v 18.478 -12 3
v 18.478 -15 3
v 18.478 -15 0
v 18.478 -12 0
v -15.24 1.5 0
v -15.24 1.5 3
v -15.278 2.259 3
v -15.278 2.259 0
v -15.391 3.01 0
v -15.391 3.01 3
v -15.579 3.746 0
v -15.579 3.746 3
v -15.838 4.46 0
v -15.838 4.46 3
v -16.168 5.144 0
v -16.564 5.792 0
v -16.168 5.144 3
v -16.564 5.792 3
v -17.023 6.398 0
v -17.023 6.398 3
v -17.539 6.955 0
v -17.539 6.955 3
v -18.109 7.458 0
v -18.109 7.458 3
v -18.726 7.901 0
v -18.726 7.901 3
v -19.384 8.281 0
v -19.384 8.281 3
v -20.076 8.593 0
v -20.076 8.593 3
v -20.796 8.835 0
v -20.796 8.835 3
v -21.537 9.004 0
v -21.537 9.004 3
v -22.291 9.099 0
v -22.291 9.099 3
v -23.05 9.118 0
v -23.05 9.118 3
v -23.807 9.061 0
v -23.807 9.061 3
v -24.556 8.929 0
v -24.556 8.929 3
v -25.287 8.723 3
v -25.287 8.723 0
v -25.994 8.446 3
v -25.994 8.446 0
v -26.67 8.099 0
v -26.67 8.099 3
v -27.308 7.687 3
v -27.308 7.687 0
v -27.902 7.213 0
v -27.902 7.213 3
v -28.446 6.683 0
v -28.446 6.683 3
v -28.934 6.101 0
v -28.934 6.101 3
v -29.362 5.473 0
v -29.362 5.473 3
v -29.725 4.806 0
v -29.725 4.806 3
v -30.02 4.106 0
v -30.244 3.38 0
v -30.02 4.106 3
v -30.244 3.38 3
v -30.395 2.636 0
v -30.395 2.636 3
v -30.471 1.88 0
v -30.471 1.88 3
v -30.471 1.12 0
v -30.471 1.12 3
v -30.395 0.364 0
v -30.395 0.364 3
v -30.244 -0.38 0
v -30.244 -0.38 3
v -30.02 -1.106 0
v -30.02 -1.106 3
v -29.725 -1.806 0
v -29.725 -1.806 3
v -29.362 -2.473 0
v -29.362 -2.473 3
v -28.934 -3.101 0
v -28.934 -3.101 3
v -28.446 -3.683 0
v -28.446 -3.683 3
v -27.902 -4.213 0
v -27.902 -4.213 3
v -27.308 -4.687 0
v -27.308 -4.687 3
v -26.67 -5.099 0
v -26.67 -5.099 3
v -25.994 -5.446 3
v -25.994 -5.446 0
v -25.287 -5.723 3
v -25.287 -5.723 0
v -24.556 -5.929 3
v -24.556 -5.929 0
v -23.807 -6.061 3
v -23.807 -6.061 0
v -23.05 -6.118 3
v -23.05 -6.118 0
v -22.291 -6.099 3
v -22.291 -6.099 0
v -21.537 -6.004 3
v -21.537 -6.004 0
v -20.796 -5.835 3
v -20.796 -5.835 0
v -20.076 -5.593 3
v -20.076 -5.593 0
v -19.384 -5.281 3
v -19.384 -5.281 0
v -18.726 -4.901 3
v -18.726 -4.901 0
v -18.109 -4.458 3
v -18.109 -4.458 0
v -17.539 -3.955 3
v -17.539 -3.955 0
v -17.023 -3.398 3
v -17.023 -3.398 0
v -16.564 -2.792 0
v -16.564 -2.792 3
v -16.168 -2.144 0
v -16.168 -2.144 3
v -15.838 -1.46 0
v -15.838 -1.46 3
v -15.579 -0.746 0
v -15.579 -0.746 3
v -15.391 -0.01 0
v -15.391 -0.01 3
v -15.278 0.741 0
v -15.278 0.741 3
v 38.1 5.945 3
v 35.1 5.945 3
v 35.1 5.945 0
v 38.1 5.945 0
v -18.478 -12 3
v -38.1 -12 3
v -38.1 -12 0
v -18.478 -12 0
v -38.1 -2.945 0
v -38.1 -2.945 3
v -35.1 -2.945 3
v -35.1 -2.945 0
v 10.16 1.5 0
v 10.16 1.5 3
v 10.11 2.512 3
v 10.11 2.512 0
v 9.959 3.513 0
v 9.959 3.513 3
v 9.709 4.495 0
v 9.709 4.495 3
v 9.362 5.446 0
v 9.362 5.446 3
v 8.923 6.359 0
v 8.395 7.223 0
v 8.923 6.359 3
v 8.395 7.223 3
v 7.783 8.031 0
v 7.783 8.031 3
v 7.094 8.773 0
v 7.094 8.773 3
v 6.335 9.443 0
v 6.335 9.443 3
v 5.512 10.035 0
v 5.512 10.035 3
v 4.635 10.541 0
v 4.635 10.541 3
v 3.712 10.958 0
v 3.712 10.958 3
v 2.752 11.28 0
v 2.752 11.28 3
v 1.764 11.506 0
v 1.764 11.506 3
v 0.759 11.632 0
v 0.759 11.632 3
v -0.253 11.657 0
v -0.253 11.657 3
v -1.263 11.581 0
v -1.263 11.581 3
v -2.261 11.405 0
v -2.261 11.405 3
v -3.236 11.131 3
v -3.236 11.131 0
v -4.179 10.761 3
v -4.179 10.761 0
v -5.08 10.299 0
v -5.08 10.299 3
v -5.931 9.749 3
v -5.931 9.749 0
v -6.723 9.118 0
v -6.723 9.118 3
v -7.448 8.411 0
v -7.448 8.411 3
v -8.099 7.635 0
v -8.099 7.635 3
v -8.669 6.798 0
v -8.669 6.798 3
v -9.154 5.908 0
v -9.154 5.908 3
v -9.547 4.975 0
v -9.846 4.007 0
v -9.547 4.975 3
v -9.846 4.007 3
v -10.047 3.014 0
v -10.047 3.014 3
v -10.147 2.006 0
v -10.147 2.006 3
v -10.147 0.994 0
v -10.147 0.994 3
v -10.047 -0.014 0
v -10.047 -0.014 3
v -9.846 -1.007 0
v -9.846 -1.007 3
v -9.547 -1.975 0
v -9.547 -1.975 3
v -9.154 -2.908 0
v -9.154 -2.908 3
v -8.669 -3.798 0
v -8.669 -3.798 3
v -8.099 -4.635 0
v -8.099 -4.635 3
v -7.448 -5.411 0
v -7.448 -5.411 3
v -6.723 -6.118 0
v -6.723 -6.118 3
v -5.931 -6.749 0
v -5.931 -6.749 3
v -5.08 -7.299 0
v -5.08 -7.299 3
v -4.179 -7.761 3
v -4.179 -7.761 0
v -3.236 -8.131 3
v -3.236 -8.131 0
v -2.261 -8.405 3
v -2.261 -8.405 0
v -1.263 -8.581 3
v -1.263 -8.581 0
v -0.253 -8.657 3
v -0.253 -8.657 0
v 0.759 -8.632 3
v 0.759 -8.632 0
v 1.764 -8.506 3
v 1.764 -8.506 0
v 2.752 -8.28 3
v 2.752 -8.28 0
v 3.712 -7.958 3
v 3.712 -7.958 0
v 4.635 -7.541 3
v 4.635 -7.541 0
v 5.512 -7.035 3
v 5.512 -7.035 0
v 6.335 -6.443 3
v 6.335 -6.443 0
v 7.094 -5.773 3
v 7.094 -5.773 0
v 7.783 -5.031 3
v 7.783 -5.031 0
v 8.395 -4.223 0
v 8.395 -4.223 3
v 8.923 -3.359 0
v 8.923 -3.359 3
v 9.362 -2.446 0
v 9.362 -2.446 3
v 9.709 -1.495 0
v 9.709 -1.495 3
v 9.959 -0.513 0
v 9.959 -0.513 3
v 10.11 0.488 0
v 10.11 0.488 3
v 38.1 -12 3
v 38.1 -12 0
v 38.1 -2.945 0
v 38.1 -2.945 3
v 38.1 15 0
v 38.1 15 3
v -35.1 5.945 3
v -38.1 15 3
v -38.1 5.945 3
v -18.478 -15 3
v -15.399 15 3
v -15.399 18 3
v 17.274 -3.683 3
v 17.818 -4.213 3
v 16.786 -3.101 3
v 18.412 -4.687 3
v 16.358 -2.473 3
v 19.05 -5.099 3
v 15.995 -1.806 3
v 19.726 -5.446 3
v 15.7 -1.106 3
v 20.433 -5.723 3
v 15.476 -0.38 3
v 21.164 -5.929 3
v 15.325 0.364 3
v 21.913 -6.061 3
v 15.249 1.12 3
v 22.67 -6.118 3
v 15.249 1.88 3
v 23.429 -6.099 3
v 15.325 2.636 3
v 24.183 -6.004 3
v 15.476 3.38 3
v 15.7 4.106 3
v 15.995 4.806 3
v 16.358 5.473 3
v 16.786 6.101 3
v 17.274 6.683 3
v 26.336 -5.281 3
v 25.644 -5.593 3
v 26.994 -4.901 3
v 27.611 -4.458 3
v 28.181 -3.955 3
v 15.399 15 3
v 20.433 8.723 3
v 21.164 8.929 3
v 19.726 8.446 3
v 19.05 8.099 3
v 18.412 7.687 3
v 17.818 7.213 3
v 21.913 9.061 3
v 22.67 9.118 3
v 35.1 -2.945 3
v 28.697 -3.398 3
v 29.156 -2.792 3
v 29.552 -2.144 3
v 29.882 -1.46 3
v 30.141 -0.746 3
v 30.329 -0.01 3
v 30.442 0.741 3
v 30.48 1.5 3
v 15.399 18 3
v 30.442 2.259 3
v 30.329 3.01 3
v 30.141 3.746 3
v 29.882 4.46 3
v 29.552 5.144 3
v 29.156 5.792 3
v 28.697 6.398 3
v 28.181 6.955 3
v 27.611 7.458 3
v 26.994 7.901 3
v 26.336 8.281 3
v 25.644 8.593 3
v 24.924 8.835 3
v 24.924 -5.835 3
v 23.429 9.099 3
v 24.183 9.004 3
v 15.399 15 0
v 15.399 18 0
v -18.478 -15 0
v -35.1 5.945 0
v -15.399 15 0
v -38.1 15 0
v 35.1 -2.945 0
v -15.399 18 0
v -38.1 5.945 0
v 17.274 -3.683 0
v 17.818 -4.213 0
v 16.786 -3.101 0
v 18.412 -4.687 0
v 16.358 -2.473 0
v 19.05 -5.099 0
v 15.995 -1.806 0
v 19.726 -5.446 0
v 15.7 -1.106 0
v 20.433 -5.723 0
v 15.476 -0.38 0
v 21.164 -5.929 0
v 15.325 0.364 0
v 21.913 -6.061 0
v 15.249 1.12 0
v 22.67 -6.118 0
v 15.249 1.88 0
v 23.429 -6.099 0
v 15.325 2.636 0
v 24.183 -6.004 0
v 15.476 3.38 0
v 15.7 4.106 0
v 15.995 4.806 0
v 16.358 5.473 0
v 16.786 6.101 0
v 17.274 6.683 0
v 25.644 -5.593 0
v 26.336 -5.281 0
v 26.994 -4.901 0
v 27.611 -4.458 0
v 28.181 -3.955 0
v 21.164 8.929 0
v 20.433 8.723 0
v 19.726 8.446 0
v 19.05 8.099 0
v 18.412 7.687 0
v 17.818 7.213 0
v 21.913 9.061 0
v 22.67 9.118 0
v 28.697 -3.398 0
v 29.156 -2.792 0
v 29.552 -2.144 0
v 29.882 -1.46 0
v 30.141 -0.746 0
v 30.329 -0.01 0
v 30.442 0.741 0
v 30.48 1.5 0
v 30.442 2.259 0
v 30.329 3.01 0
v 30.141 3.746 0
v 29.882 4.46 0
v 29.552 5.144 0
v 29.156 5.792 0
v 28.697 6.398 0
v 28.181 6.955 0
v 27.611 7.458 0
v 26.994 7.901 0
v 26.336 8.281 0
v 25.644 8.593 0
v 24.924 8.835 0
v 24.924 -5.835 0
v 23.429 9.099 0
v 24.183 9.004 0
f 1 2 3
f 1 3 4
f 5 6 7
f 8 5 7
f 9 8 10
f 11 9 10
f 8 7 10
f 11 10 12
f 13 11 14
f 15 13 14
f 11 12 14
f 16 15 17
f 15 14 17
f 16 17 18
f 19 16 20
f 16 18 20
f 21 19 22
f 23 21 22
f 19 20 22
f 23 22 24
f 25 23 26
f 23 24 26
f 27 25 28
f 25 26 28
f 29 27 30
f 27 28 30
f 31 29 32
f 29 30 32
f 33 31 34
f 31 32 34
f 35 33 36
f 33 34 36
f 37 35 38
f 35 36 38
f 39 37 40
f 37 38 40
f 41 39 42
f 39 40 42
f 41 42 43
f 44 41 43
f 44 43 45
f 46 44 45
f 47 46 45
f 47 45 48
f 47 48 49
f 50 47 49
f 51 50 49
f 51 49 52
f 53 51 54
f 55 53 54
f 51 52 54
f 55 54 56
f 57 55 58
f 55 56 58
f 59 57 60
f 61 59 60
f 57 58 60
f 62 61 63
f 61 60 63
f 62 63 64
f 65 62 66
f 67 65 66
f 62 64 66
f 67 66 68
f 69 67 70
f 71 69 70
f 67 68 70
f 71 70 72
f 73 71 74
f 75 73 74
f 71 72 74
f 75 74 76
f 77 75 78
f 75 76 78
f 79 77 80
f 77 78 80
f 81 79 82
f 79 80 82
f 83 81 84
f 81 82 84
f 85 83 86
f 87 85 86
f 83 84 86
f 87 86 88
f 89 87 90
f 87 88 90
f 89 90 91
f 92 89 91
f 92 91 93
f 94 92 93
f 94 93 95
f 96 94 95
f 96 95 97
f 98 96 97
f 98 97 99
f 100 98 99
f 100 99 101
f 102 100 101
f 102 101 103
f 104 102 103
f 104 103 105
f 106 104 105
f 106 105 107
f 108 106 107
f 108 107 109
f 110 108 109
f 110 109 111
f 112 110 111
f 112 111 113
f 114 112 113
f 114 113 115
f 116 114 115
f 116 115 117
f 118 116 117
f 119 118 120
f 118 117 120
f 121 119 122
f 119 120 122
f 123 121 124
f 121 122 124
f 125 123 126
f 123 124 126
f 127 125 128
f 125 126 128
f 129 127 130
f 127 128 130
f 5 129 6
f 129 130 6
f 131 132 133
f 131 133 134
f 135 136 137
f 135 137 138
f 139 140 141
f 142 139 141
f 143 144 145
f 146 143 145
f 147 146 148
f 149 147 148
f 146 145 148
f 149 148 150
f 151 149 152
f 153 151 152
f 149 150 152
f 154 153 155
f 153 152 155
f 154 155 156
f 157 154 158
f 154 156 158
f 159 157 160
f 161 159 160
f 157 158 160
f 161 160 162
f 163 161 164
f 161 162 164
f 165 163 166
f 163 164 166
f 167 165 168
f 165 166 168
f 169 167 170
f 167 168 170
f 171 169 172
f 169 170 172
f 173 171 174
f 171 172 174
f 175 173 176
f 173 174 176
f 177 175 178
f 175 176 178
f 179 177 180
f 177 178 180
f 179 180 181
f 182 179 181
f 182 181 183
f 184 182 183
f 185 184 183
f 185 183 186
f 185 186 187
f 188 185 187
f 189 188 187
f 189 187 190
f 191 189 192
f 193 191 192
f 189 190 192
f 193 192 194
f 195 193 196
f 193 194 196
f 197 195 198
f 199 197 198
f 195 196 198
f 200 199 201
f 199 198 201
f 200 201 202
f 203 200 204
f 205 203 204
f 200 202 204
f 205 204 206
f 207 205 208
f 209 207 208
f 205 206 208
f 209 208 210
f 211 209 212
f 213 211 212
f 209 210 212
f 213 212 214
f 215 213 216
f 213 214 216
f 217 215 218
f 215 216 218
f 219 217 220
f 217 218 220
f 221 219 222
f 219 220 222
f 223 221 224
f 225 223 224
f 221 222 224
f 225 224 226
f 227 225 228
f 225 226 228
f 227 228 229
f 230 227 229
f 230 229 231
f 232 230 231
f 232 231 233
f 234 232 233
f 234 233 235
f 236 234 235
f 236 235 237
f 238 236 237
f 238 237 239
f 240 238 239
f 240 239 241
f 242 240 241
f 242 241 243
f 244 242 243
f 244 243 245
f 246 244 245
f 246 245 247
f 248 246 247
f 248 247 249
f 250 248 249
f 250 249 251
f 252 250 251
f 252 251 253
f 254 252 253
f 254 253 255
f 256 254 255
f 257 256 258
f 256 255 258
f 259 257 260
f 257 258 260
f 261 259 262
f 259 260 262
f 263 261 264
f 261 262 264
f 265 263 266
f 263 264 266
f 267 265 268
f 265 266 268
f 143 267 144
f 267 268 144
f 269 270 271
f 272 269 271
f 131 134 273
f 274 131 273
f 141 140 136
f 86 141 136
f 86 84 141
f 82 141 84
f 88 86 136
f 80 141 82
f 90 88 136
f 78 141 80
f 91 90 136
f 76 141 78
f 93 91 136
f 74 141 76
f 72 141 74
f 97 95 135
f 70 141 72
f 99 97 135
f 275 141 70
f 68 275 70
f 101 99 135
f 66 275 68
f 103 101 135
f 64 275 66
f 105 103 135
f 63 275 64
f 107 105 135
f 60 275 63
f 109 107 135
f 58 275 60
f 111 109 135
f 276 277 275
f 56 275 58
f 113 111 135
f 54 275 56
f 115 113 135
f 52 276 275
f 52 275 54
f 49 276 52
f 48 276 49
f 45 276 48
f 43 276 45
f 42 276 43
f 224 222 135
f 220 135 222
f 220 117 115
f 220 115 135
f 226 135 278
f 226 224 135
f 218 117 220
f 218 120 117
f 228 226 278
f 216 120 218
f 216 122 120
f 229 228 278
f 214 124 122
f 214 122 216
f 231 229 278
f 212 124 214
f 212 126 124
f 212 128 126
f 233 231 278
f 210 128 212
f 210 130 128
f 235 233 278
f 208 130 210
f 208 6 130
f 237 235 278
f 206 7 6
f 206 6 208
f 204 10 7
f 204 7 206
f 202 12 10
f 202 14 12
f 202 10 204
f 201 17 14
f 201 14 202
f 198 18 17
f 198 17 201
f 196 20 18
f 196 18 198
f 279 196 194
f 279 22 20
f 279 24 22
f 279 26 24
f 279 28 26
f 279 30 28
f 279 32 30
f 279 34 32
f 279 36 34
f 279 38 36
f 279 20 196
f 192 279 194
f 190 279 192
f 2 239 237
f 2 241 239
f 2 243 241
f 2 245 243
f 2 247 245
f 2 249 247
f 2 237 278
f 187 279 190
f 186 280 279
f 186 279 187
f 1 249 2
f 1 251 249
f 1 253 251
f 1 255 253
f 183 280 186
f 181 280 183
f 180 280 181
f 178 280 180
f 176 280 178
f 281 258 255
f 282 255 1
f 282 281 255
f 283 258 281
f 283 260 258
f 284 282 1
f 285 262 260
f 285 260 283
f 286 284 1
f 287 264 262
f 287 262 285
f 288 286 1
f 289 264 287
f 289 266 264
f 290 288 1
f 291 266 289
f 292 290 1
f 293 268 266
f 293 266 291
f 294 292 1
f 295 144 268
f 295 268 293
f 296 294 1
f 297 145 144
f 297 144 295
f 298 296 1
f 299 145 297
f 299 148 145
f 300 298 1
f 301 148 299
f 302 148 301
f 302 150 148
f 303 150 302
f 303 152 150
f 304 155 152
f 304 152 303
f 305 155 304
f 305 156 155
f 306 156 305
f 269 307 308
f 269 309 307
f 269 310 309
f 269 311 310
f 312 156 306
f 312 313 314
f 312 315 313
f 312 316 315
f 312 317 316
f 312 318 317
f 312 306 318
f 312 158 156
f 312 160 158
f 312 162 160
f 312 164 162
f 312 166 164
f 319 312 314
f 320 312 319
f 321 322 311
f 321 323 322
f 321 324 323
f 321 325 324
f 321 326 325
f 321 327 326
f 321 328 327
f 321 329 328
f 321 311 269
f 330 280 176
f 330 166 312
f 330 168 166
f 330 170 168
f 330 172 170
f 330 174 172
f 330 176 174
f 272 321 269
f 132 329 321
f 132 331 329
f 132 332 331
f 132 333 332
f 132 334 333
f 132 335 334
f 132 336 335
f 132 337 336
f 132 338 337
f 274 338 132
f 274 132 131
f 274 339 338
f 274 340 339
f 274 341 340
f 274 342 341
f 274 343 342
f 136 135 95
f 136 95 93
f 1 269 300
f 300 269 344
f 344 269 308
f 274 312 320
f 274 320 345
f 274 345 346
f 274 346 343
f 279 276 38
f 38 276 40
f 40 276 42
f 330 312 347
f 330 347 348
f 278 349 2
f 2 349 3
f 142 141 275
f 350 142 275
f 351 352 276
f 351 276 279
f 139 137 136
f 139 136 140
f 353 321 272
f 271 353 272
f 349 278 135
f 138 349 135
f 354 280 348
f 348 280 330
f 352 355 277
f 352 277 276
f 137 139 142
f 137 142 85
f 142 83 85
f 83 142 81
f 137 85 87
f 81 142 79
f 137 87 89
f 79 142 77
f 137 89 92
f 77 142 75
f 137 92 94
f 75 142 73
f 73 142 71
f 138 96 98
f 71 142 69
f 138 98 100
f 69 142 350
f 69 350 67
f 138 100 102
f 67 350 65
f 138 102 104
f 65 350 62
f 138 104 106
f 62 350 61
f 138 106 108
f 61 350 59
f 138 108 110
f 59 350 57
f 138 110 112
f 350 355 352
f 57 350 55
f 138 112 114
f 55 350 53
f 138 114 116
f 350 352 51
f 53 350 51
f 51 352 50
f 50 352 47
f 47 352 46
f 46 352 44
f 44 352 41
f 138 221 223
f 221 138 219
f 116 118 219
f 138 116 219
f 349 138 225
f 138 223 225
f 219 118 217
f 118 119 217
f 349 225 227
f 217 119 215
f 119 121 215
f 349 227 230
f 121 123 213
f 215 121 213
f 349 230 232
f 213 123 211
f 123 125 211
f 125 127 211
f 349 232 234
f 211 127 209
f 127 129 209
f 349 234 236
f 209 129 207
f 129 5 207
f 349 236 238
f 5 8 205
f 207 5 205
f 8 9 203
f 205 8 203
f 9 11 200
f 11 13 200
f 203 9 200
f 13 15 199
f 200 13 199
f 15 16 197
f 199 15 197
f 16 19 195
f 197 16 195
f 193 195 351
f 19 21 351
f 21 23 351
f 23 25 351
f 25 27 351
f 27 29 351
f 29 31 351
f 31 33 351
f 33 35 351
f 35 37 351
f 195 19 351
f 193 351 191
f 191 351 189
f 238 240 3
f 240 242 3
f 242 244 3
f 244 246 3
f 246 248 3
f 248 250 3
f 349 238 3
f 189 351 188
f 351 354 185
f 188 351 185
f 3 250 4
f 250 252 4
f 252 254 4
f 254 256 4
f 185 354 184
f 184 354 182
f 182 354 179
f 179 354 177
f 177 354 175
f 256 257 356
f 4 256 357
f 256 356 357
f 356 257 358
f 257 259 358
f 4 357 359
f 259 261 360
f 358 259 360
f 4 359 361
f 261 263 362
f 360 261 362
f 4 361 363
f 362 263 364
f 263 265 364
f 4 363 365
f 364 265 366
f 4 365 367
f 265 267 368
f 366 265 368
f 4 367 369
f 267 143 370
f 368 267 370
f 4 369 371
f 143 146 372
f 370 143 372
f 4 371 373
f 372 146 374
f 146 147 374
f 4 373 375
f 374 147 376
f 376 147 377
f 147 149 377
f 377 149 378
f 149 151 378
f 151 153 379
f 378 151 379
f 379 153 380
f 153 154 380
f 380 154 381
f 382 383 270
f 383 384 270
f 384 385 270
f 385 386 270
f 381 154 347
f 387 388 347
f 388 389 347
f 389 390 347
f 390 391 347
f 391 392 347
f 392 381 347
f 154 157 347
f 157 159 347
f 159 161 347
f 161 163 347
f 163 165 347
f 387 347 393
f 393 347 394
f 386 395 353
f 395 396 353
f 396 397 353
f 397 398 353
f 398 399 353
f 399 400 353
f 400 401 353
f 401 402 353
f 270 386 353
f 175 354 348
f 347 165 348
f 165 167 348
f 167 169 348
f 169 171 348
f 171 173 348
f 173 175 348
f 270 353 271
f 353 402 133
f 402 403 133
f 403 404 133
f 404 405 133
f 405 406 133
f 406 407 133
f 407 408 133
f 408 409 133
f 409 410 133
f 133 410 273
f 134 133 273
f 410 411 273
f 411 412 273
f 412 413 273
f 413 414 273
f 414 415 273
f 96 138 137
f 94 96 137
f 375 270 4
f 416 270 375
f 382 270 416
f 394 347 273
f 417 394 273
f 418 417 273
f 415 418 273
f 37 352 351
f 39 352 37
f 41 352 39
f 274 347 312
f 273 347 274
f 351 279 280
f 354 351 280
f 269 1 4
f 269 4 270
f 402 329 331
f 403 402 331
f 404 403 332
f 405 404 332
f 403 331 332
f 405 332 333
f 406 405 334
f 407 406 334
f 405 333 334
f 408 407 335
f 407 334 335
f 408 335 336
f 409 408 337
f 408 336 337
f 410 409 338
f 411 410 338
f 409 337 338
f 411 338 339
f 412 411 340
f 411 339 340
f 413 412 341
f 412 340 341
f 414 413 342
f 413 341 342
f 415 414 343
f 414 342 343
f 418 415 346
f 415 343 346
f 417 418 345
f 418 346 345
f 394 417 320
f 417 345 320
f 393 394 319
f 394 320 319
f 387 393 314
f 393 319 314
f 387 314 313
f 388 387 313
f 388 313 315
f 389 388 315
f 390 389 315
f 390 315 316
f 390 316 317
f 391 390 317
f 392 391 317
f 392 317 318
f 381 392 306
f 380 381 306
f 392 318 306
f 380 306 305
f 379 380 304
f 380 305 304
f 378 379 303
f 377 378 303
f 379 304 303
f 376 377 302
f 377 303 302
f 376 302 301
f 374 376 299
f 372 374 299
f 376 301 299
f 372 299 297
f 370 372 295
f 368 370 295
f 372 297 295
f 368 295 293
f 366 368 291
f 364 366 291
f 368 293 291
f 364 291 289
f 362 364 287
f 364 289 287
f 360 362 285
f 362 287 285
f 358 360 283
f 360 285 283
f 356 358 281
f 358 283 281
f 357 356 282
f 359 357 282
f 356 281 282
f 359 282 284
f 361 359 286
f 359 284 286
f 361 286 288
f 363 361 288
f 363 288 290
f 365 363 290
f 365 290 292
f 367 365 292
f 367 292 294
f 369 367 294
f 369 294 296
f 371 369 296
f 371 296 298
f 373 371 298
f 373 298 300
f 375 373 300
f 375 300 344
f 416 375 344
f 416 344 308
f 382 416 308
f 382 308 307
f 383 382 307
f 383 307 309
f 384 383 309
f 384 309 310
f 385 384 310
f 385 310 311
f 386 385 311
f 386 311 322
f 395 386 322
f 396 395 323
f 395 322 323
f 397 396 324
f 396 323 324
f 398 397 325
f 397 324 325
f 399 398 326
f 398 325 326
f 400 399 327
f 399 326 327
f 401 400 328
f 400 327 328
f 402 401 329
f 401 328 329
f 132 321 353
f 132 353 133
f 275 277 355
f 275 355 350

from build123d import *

# Parameters (mm, degrees)
SKETCH_1_W          = 76.2
SKETCH_1_H          = 30
EXTRUDE_1_DEPTH     = 3
SKETCH_2_W          = 19.6215
SKETCH_2_H          = 3
CUT_EXTRUDE_1_DEPTH = 3
SKETCH_3_W          = 3
SKETCH_3_H          = 8.89
CUT_EXTRUDE_2_DEPTH = 3
SKETCH_4_W          = 30.7975
SKETCH_4_H          = 3
EXTRUDE_2_DEPTH     = 3
SKETCH_6_R          = 10.16
SKETCH_6_R_2        = 7.62
CUT_EXTRUDE_4_DEPTH = 3


with BuildPart() as part:
    # 스케치1 → 보스-돌출1 (new body)
    with BuildSketch(Plane.XY):
        Rectangle(SKETCH_1_W, SKETCH_1_H)
    extrude(amount=EXTRUDE_1_DEPTH)

    # 스케치2 → 컷-돌출1 (cut)
    with BuildSketch(Plane.XY.offset(3)):
        with Locations((-28.28925, -13.5)):
            Rectangle(SKETCH_2_W, SKETCH_2_H)
        with Locations((28.28925, -13.5)):
            Rectangle(SKETCH_2_W, SKETCH_2_H)
    extrude(amount=-CUT_EXTRUDE_1_DEPTH, mode=Mode.SUBTRACT)

    # 스케치3 → 컷-돌출2 (cut)
    with BuildSketch(Plane.XY.offset(3)):
        with Locations((-36.6, 1.5)):
            Rectangle(SKETCH_3_W, SKETCH_3_H)
        with Locations((36.6, 1.5)):
            Rectangle(SKETCH_3_W, SKETCH_3_H)
    extrude(amount=-CUT_EXTRUDE_2_DEPTH, mode=Mode.SUBTRACT)

    # 스케치4 → 보스-돌출2 (add)
    with BuildSketch(Plane.XY.offset(3)):
        with Locations((0, 16.5)):
            Rectangle(SKETCH_4_W, SKETCH_4_H)
    extrude(amount=-EXTRUDE_2_DEPTH)

    # 스케치6 → 컷-돌출4 (cut)
    with BuildSketch(Plane.XY.offset(3)):
        with Locations((0, 1.5)):
            Circle(SKETCH_6_R)
        with Locations((-22.86, 1.5)):
            Circle(SKETCH_6_R_2)
        with Locations((22.86, 1.5)):
            Circle(SKETCH_6_R_2)
    extrude(amount=-CUT_EXTRUDE_4_DEPTH, mode=Mode.SUBTRACT)


solid = part.part
